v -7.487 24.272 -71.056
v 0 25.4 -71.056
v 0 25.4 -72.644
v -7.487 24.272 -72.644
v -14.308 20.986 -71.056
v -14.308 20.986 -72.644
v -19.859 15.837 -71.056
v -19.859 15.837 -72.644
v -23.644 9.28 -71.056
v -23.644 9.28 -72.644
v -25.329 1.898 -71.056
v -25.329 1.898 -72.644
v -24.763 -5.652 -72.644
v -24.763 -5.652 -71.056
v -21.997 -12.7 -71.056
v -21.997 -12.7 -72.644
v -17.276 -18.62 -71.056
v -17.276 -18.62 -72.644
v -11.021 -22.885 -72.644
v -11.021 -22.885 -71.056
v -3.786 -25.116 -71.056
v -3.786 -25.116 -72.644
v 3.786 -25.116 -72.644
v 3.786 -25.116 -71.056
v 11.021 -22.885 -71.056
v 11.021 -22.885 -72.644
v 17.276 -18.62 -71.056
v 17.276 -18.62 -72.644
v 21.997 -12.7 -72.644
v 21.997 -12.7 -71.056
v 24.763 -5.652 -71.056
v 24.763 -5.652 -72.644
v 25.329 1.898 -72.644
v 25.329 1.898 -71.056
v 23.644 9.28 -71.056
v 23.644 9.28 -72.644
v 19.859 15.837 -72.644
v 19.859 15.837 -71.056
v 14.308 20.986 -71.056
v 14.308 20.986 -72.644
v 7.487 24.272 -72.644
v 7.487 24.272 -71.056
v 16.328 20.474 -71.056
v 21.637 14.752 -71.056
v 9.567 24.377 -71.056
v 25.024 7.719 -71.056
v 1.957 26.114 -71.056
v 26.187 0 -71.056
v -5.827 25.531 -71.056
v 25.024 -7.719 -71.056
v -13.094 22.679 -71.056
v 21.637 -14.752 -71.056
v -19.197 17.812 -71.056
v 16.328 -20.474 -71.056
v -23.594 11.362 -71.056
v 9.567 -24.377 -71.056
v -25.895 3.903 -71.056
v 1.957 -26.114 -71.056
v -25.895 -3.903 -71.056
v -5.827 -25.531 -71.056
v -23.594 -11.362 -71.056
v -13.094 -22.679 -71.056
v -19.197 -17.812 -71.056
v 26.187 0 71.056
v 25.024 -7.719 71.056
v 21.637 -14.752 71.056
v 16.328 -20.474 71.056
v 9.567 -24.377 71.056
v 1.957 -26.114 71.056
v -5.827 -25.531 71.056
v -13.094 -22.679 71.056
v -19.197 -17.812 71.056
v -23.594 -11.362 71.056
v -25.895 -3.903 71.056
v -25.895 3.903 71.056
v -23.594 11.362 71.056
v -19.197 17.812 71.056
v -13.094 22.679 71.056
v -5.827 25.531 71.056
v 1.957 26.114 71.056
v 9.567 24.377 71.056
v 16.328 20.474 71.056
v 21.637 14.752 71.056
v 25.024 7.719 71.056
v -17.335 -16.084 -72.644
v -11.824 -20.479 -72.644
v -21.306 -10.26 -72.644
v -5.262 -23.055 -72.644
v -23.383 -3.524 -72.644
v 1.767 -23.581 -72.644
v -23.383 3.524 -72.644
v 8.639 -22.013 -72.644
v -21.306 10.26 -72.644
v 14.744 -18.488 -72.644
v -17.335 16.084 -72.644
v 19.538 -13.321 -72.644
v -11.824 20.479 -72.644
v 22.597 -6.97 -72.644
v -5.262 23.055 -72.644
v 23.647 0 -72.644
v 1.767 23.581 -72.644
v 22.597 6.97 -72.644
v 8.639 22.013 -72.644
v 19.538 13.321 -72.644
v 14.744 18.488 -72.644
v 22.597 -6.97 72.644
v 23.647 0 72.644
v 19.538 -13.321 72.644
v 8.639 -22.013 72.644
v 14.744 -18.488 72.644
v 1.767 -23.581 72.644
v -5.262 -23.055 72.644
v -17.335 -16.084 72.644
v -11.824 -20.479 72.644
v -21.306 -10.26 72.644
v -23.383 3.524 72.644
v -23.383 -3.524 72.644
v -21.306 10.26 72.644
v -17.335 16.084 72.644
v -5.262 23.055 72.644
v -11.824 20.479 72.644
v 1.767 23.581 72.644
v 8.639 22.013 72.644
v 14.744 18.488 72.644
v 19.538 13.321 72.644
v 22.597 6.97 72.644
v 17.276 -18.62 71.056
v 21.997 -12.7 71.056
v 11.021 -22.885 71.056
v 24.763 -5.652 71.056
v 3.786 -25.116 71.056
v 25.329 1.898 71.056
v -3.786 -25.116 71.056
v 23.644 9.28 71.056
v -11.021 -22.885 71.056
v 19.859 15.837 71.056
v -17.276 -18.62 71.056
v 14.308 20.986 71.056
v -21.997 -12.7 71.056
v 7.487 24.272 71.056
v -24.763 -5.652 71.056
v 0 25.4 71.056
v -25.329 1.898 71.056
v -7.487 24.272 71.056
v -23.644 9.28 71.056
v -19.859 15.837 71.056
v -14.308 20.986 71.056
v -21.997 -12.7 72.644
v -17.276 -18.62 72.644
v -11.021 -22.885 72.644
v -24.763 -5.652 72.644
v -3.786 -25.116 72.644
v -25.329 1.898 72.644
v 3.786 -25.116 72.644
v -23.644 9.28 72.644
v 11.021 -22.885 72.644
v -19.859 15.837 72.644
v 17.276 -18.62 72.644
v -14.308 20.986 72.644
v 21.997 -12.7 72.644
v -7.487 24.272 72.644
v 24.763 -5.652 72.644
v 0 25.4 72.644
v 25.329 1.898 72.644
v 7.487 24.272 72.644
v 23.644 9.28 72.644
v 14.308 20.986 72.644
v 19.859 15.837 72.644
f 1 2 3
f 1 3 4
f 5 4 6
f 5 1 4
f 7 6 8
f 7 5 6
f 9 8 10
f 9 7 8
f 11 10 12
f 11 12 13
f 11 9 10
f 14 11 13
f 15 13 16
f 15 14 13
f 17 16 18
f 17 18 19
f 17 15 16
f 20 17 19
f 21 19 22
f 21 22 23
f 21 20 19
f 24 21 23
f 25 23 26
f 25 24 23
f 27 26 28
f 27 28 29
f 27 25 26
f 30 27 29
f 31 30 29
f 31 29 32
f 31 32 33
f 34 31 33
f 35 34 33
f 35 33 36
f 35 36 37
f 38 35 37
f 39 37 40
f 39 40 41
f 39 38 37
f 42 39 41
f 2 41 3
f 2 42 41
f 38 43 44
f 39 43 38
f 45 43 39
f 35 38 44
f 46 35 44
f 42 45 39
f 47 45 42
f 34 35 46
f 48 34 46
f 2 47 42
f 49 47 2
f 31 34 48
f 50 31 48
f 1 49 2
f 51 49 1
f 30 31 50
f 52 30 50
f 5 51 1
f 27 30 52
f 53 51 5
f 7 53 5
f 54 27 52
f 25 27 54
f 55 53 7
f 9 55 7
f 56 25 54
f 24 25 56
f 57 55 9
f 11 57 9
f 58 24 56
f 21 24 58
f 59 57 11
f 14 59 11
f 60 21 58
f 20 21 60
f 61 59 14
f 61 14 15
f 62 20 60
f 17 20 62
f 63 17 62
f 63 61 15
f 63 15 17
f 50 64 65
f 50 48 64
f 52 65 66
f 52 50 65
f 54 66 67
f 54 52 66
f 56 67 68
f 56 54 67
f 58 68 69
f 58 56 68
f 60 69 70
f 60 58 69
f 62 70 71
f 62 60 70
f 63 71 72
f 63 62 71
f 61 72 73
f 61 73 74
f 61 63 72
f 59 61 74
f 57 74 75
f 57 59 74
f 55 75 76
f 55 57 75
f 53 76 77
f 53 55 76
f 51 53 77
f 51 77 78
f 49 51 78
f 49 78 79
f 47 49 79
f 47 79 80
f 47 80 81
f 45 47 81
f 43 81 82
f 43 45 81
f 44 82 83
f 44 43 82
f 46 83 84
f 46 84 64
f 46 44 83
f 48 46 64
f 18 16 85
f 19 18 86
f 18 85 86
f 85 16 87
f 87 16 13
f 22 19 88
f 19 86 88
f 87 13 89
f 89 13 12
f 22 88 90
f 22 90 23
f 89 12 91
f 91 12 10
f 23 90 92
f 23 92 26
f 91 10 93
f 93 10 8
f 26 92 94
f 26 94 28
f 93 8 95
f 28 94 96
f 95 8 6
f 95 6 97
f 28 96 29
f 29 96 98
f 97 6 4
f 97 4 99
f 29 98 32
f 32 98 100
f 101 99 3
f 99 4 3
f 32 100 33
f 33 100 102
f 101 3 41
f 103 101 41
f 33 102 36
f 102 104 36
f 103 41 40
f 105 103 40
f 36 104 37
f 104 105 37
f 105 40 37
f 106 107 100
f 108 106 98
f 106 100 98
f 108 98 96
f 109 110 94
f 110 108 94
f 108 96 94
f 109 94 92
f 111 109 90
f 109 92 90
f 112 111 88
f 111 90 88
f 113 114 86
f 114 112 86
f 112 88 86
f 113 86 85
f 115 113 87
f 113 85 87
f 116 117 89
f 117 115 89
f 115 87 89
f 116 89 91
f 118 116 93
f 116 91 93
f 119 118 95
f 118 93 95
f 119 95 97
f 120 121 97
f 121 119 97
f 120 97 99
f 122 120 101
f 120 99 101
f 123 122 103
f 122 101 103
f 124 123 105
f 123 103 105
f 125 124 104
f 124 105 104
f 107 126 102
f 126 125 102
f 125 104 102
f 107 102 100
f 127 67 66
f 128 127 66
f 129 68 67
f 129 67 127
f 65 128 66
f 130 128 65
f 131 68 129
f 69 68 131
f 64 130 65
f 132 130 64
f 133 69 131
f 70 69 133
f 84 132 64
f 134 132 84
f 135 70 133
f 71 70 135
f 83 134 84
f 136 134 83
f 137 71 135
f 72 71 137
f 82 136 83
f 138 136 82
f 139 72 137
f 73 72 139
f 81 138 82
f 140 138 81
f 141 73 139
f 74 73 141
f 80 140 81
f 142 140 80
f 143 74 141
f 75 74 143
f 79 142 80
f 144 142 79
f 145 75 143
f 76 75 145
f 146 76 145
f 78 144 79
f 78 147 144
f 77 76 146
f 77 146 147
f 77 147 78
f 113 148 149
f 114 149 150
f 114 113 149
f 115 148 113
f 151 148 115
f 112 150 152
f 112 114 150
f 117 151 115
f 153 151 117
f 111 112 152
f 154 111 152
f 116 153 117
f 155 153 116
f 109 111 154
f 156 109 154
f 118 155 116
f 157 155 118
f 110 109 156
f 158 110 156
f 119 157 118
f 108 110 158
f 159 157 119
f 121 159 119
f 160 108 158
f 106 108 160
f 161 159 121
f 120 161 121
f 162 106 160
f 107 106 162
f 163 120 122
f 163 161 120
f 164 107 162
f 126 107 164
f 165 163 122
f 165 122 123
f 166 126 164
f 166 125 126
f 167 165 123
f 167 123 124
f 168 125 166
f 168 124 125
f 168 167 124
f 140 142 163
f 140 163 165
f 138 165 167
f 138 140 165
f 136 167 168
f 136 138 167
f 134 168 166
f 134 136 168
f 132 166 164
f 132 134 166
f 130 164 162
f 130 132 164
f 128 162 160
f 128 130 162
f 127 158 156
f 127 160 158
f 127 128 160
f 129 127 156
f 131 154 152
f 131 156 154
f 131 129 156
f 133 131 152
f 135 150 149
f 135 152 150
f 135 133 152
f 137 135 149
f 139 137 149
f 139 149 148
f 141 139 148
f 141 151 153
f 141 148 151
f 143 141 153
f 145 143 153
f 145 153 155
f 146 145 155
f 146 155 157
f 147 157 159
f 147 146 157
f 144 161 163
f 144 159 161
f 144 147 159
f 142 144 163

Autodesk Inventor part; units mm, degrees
ref_plane "YZ Plane" through (0, 0, 0) normal (1, 0, 0) x (0, 1, 0)
ref_plane "XZ Plane" through (0, 0, 0) normal (0, 1, 0) x (-1, 0, 0)
ref_plane "XY Plane" through (0, 0, 0) normal (0, 0, 1) x (1, 0, 0)
sketch "Sketch1" plane through (0, 0, 0) normal (0, 0, 1) x (1, 0, 0)
  circle A0 centre (0, 0) radius 26.1874
  circle A1 centre (0, 0) radius 23.6474
  dimension "d0" = 52.3748
  dimension "d1" = 2.54
extrude "Extrusion1" add sketch "Sketch1" along normal mid plane 145.288
sketch "Sketch2" plane through (0, 0, 0) normal (1, 0, 0) x (0, 1, 0)
  line L0 (-26.1874, 72.644) -> (26.1874, 72.644) projected
  line L1 (-23.6474, 72.644) -> (23.6474, 72.644) projected
  line L2 (26.1874, 72.644) -> (25.4, 72.644)
  line L3 (25.4, 72.644) -> (25.4, 71.0565)
  line L4 (25.4, 71.0565) -> (26.1874, 71.0565)
  line L5 (26.1874, 71.0565) -> (26.1874, 72.644)
  line L6 (0, -14.5288) -> (0, 87.1728) projected
  point P0 (0, 0)
  dimension "d4" = 1.5875
  dimension "d5" = 0.7874
revolve "Revolution1" cut sketch "Sketch2" angle 360 about axis through (0, 0, -10) along (0, 0, 1)
mirror "Mirror1" about plane through (0, 0, 0) normal (0, 0, 1) of "Revolution1"
properties material "Stainless Steel"
